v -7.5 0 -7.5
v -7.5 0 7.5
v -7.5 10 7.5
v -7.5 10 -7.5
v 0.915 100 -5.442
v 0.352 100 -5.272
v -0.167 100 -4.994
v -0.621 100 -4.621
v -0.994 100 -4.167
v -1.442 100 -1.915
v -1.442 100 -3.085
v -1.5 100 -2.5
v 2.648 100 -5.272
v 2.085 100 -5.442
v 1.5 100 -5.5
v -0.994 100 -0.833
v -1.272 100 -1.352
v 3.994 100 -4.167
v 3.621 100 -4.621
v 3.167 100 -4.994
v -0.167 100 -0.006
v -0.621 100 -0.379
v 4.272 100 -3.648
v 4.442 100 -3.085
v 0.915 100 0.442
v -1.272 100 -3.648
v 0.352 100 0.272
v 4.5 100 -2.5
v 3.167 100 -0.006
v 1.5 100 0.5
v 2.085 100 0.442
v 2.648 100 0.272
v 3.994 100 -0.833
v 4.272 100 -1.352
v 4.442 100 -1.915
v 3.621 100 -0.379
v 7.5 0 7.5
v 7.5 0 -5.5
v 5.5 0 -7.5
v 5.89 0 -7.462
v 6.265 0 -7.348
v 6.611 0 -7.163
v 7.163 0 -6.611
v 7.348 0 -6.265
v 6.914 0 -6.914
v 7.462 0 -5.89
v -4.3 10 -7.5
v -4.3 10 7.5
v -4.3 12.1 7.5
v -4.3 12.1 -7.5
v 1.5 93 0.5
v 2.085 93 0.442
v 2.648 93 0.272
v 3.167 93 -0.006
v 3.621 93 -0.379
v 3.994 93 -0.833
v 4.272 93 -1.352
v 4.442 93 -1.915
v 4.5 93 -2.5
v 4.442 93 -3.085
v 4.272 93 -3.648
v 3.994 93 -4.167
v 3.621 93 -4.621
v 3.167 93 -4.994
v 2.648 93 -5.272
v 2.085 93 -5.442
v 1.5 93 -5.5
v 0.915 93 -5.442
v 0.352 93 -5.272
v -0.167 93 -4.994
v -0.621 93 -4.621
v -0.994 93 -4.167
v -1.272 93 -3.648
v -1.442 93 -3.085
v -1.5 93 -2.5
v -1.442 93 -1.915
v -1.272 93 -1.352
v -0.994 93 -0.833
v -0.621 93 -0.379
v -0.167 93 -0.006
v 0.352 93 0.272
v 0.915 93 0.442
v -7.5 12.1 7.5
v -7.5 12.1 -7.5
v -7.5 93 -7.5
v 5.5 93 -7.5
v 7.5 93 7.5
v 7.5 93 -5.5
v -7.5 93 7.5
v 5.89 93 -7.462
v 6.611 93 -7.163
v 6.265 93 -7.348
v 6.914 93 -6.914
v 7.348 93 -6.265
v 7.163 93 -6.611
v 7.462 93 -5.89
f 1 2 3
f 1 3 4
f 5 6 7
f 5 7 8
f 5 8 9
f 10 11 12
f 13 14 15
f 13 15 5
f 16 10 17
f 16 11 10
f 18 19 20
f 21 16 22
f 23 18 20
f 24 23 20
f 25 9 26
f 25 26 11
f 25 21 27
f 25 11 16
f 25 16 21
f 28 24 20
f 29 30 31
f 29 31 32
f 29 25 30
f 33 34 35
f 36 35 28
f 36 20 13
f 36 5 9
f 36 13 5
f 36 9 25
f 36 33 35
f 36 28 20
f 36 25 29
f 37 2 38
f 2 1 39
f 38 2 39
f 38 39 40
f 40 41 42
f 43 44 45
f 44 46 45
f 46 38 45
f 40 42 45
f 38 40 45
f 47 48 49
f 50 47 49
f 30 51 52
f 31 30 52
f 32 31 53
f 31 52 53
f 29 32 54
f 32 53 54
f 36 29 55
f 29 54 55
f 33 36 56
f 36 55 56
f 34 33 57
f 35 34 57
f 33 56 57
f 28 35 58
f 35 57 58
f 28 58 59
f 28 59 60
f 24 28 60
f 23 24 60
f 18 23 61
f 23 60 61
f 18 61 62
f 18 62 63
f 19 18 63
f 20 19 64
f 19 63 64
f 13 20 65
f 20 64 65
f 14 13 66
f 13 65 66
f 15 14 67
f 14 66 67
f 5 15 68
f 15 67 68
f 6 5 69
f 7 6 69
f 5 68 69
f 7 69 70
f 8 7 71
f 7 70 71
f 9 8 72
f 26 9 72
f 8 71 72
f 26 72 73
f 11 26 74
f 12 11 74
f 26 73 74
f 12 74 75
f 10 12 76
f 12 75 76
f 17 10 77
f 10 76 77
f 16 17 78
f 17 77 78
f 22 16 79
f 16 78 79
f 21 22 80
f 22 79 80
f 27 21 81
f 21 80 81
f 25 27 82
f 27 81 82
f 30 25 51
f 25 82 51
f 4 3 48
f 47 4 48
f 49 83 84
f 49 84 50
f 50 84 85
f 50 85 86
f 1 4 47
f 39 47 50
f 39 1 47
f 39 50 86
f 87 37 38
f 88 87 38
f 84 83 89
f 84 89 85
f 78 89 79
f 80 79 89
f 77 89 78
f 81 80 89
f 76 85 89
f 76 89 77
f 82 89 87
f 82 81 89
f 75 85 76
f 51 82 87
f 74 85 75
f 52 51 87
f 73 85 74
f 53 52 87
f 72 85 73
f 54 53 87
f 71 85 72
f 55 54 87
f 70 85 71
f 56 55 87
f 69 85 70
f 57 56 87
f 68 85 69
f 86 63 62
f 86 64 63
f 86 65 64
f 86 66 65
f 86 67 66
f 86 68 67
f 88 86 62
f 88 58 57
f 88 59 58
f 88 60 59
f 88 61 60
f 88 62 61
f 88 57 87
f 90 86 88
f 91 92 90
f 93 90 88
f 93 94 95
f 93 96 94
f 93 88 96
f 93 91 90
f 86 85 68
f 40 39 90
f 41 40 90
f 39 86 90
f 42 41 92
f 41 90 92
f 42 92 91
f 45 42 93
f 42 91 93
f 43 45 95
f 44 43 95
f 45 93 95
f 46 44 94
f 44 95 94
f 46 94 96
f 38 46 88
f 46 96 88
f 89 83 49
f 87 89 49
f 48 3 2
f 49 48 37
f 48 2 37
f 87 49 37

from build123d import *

# Parameters (mm, degrees)
SKETCH1_W           = 15
SKETCH1_H           = 15
BOSS_EXTRUDE1_DEPTH = 93
SKETCH2_R           = 3
BOSS_EXTRUDE2_DEPTH = 7
SKETCH3_W           = 3.2
SKETCH3_H           = 2.1
CUT_EXTRUDE1_DEPTH  = 102.396498953
FILLET1_R           = 2


with BuildPart() as part:
    # Sketch1 → Boss-Extrude1 (new body)
    with BuildSketch(Plane(origin=(0, 0, 0), x_dir=(1, 0, 0), z_dir=(0, 1, 0))):
        Rectangle(SKETCH1_W, SKETCH1_H)
    extrude(amount=BOSS_EXTRUDE1_DEPTH)

    # Sketch2 → Boss-Extrude2 (add)
    with BuildSketch(Plane(origin=(0, 93, 0), x_dir=(1, 0, 0), z_dir=(0, 1, 0))):
        with Locations(Location((1.5, 2.5, 0), (0, 0, 270))):
            Circle(SKETCH2_R)
    extrude(amount=BOSS_EXTRUDE2_DEPTH)

    # Sketch3 → Cut-Extrude1 (cut, through all)
    with BuildSketch(Plane.XY.offset(7.5)):
        with Locations((-5.9, 11.05)):
            Rectangle(SKETCH3_W, SKETCH3_H)
    extrude(amount=-CUT_EXTRUDE1_DEPTH, mode=Mode.SUBTRACT)

    # Fillet1
    fillet1_edges = [part.edges().sort_by_distance(p)[0] for p in [
        (7.5, 46.5, -7.5),
    ]]
    fillet(fillet1_edges, radius=FILLET1_R)


solid = part.part
